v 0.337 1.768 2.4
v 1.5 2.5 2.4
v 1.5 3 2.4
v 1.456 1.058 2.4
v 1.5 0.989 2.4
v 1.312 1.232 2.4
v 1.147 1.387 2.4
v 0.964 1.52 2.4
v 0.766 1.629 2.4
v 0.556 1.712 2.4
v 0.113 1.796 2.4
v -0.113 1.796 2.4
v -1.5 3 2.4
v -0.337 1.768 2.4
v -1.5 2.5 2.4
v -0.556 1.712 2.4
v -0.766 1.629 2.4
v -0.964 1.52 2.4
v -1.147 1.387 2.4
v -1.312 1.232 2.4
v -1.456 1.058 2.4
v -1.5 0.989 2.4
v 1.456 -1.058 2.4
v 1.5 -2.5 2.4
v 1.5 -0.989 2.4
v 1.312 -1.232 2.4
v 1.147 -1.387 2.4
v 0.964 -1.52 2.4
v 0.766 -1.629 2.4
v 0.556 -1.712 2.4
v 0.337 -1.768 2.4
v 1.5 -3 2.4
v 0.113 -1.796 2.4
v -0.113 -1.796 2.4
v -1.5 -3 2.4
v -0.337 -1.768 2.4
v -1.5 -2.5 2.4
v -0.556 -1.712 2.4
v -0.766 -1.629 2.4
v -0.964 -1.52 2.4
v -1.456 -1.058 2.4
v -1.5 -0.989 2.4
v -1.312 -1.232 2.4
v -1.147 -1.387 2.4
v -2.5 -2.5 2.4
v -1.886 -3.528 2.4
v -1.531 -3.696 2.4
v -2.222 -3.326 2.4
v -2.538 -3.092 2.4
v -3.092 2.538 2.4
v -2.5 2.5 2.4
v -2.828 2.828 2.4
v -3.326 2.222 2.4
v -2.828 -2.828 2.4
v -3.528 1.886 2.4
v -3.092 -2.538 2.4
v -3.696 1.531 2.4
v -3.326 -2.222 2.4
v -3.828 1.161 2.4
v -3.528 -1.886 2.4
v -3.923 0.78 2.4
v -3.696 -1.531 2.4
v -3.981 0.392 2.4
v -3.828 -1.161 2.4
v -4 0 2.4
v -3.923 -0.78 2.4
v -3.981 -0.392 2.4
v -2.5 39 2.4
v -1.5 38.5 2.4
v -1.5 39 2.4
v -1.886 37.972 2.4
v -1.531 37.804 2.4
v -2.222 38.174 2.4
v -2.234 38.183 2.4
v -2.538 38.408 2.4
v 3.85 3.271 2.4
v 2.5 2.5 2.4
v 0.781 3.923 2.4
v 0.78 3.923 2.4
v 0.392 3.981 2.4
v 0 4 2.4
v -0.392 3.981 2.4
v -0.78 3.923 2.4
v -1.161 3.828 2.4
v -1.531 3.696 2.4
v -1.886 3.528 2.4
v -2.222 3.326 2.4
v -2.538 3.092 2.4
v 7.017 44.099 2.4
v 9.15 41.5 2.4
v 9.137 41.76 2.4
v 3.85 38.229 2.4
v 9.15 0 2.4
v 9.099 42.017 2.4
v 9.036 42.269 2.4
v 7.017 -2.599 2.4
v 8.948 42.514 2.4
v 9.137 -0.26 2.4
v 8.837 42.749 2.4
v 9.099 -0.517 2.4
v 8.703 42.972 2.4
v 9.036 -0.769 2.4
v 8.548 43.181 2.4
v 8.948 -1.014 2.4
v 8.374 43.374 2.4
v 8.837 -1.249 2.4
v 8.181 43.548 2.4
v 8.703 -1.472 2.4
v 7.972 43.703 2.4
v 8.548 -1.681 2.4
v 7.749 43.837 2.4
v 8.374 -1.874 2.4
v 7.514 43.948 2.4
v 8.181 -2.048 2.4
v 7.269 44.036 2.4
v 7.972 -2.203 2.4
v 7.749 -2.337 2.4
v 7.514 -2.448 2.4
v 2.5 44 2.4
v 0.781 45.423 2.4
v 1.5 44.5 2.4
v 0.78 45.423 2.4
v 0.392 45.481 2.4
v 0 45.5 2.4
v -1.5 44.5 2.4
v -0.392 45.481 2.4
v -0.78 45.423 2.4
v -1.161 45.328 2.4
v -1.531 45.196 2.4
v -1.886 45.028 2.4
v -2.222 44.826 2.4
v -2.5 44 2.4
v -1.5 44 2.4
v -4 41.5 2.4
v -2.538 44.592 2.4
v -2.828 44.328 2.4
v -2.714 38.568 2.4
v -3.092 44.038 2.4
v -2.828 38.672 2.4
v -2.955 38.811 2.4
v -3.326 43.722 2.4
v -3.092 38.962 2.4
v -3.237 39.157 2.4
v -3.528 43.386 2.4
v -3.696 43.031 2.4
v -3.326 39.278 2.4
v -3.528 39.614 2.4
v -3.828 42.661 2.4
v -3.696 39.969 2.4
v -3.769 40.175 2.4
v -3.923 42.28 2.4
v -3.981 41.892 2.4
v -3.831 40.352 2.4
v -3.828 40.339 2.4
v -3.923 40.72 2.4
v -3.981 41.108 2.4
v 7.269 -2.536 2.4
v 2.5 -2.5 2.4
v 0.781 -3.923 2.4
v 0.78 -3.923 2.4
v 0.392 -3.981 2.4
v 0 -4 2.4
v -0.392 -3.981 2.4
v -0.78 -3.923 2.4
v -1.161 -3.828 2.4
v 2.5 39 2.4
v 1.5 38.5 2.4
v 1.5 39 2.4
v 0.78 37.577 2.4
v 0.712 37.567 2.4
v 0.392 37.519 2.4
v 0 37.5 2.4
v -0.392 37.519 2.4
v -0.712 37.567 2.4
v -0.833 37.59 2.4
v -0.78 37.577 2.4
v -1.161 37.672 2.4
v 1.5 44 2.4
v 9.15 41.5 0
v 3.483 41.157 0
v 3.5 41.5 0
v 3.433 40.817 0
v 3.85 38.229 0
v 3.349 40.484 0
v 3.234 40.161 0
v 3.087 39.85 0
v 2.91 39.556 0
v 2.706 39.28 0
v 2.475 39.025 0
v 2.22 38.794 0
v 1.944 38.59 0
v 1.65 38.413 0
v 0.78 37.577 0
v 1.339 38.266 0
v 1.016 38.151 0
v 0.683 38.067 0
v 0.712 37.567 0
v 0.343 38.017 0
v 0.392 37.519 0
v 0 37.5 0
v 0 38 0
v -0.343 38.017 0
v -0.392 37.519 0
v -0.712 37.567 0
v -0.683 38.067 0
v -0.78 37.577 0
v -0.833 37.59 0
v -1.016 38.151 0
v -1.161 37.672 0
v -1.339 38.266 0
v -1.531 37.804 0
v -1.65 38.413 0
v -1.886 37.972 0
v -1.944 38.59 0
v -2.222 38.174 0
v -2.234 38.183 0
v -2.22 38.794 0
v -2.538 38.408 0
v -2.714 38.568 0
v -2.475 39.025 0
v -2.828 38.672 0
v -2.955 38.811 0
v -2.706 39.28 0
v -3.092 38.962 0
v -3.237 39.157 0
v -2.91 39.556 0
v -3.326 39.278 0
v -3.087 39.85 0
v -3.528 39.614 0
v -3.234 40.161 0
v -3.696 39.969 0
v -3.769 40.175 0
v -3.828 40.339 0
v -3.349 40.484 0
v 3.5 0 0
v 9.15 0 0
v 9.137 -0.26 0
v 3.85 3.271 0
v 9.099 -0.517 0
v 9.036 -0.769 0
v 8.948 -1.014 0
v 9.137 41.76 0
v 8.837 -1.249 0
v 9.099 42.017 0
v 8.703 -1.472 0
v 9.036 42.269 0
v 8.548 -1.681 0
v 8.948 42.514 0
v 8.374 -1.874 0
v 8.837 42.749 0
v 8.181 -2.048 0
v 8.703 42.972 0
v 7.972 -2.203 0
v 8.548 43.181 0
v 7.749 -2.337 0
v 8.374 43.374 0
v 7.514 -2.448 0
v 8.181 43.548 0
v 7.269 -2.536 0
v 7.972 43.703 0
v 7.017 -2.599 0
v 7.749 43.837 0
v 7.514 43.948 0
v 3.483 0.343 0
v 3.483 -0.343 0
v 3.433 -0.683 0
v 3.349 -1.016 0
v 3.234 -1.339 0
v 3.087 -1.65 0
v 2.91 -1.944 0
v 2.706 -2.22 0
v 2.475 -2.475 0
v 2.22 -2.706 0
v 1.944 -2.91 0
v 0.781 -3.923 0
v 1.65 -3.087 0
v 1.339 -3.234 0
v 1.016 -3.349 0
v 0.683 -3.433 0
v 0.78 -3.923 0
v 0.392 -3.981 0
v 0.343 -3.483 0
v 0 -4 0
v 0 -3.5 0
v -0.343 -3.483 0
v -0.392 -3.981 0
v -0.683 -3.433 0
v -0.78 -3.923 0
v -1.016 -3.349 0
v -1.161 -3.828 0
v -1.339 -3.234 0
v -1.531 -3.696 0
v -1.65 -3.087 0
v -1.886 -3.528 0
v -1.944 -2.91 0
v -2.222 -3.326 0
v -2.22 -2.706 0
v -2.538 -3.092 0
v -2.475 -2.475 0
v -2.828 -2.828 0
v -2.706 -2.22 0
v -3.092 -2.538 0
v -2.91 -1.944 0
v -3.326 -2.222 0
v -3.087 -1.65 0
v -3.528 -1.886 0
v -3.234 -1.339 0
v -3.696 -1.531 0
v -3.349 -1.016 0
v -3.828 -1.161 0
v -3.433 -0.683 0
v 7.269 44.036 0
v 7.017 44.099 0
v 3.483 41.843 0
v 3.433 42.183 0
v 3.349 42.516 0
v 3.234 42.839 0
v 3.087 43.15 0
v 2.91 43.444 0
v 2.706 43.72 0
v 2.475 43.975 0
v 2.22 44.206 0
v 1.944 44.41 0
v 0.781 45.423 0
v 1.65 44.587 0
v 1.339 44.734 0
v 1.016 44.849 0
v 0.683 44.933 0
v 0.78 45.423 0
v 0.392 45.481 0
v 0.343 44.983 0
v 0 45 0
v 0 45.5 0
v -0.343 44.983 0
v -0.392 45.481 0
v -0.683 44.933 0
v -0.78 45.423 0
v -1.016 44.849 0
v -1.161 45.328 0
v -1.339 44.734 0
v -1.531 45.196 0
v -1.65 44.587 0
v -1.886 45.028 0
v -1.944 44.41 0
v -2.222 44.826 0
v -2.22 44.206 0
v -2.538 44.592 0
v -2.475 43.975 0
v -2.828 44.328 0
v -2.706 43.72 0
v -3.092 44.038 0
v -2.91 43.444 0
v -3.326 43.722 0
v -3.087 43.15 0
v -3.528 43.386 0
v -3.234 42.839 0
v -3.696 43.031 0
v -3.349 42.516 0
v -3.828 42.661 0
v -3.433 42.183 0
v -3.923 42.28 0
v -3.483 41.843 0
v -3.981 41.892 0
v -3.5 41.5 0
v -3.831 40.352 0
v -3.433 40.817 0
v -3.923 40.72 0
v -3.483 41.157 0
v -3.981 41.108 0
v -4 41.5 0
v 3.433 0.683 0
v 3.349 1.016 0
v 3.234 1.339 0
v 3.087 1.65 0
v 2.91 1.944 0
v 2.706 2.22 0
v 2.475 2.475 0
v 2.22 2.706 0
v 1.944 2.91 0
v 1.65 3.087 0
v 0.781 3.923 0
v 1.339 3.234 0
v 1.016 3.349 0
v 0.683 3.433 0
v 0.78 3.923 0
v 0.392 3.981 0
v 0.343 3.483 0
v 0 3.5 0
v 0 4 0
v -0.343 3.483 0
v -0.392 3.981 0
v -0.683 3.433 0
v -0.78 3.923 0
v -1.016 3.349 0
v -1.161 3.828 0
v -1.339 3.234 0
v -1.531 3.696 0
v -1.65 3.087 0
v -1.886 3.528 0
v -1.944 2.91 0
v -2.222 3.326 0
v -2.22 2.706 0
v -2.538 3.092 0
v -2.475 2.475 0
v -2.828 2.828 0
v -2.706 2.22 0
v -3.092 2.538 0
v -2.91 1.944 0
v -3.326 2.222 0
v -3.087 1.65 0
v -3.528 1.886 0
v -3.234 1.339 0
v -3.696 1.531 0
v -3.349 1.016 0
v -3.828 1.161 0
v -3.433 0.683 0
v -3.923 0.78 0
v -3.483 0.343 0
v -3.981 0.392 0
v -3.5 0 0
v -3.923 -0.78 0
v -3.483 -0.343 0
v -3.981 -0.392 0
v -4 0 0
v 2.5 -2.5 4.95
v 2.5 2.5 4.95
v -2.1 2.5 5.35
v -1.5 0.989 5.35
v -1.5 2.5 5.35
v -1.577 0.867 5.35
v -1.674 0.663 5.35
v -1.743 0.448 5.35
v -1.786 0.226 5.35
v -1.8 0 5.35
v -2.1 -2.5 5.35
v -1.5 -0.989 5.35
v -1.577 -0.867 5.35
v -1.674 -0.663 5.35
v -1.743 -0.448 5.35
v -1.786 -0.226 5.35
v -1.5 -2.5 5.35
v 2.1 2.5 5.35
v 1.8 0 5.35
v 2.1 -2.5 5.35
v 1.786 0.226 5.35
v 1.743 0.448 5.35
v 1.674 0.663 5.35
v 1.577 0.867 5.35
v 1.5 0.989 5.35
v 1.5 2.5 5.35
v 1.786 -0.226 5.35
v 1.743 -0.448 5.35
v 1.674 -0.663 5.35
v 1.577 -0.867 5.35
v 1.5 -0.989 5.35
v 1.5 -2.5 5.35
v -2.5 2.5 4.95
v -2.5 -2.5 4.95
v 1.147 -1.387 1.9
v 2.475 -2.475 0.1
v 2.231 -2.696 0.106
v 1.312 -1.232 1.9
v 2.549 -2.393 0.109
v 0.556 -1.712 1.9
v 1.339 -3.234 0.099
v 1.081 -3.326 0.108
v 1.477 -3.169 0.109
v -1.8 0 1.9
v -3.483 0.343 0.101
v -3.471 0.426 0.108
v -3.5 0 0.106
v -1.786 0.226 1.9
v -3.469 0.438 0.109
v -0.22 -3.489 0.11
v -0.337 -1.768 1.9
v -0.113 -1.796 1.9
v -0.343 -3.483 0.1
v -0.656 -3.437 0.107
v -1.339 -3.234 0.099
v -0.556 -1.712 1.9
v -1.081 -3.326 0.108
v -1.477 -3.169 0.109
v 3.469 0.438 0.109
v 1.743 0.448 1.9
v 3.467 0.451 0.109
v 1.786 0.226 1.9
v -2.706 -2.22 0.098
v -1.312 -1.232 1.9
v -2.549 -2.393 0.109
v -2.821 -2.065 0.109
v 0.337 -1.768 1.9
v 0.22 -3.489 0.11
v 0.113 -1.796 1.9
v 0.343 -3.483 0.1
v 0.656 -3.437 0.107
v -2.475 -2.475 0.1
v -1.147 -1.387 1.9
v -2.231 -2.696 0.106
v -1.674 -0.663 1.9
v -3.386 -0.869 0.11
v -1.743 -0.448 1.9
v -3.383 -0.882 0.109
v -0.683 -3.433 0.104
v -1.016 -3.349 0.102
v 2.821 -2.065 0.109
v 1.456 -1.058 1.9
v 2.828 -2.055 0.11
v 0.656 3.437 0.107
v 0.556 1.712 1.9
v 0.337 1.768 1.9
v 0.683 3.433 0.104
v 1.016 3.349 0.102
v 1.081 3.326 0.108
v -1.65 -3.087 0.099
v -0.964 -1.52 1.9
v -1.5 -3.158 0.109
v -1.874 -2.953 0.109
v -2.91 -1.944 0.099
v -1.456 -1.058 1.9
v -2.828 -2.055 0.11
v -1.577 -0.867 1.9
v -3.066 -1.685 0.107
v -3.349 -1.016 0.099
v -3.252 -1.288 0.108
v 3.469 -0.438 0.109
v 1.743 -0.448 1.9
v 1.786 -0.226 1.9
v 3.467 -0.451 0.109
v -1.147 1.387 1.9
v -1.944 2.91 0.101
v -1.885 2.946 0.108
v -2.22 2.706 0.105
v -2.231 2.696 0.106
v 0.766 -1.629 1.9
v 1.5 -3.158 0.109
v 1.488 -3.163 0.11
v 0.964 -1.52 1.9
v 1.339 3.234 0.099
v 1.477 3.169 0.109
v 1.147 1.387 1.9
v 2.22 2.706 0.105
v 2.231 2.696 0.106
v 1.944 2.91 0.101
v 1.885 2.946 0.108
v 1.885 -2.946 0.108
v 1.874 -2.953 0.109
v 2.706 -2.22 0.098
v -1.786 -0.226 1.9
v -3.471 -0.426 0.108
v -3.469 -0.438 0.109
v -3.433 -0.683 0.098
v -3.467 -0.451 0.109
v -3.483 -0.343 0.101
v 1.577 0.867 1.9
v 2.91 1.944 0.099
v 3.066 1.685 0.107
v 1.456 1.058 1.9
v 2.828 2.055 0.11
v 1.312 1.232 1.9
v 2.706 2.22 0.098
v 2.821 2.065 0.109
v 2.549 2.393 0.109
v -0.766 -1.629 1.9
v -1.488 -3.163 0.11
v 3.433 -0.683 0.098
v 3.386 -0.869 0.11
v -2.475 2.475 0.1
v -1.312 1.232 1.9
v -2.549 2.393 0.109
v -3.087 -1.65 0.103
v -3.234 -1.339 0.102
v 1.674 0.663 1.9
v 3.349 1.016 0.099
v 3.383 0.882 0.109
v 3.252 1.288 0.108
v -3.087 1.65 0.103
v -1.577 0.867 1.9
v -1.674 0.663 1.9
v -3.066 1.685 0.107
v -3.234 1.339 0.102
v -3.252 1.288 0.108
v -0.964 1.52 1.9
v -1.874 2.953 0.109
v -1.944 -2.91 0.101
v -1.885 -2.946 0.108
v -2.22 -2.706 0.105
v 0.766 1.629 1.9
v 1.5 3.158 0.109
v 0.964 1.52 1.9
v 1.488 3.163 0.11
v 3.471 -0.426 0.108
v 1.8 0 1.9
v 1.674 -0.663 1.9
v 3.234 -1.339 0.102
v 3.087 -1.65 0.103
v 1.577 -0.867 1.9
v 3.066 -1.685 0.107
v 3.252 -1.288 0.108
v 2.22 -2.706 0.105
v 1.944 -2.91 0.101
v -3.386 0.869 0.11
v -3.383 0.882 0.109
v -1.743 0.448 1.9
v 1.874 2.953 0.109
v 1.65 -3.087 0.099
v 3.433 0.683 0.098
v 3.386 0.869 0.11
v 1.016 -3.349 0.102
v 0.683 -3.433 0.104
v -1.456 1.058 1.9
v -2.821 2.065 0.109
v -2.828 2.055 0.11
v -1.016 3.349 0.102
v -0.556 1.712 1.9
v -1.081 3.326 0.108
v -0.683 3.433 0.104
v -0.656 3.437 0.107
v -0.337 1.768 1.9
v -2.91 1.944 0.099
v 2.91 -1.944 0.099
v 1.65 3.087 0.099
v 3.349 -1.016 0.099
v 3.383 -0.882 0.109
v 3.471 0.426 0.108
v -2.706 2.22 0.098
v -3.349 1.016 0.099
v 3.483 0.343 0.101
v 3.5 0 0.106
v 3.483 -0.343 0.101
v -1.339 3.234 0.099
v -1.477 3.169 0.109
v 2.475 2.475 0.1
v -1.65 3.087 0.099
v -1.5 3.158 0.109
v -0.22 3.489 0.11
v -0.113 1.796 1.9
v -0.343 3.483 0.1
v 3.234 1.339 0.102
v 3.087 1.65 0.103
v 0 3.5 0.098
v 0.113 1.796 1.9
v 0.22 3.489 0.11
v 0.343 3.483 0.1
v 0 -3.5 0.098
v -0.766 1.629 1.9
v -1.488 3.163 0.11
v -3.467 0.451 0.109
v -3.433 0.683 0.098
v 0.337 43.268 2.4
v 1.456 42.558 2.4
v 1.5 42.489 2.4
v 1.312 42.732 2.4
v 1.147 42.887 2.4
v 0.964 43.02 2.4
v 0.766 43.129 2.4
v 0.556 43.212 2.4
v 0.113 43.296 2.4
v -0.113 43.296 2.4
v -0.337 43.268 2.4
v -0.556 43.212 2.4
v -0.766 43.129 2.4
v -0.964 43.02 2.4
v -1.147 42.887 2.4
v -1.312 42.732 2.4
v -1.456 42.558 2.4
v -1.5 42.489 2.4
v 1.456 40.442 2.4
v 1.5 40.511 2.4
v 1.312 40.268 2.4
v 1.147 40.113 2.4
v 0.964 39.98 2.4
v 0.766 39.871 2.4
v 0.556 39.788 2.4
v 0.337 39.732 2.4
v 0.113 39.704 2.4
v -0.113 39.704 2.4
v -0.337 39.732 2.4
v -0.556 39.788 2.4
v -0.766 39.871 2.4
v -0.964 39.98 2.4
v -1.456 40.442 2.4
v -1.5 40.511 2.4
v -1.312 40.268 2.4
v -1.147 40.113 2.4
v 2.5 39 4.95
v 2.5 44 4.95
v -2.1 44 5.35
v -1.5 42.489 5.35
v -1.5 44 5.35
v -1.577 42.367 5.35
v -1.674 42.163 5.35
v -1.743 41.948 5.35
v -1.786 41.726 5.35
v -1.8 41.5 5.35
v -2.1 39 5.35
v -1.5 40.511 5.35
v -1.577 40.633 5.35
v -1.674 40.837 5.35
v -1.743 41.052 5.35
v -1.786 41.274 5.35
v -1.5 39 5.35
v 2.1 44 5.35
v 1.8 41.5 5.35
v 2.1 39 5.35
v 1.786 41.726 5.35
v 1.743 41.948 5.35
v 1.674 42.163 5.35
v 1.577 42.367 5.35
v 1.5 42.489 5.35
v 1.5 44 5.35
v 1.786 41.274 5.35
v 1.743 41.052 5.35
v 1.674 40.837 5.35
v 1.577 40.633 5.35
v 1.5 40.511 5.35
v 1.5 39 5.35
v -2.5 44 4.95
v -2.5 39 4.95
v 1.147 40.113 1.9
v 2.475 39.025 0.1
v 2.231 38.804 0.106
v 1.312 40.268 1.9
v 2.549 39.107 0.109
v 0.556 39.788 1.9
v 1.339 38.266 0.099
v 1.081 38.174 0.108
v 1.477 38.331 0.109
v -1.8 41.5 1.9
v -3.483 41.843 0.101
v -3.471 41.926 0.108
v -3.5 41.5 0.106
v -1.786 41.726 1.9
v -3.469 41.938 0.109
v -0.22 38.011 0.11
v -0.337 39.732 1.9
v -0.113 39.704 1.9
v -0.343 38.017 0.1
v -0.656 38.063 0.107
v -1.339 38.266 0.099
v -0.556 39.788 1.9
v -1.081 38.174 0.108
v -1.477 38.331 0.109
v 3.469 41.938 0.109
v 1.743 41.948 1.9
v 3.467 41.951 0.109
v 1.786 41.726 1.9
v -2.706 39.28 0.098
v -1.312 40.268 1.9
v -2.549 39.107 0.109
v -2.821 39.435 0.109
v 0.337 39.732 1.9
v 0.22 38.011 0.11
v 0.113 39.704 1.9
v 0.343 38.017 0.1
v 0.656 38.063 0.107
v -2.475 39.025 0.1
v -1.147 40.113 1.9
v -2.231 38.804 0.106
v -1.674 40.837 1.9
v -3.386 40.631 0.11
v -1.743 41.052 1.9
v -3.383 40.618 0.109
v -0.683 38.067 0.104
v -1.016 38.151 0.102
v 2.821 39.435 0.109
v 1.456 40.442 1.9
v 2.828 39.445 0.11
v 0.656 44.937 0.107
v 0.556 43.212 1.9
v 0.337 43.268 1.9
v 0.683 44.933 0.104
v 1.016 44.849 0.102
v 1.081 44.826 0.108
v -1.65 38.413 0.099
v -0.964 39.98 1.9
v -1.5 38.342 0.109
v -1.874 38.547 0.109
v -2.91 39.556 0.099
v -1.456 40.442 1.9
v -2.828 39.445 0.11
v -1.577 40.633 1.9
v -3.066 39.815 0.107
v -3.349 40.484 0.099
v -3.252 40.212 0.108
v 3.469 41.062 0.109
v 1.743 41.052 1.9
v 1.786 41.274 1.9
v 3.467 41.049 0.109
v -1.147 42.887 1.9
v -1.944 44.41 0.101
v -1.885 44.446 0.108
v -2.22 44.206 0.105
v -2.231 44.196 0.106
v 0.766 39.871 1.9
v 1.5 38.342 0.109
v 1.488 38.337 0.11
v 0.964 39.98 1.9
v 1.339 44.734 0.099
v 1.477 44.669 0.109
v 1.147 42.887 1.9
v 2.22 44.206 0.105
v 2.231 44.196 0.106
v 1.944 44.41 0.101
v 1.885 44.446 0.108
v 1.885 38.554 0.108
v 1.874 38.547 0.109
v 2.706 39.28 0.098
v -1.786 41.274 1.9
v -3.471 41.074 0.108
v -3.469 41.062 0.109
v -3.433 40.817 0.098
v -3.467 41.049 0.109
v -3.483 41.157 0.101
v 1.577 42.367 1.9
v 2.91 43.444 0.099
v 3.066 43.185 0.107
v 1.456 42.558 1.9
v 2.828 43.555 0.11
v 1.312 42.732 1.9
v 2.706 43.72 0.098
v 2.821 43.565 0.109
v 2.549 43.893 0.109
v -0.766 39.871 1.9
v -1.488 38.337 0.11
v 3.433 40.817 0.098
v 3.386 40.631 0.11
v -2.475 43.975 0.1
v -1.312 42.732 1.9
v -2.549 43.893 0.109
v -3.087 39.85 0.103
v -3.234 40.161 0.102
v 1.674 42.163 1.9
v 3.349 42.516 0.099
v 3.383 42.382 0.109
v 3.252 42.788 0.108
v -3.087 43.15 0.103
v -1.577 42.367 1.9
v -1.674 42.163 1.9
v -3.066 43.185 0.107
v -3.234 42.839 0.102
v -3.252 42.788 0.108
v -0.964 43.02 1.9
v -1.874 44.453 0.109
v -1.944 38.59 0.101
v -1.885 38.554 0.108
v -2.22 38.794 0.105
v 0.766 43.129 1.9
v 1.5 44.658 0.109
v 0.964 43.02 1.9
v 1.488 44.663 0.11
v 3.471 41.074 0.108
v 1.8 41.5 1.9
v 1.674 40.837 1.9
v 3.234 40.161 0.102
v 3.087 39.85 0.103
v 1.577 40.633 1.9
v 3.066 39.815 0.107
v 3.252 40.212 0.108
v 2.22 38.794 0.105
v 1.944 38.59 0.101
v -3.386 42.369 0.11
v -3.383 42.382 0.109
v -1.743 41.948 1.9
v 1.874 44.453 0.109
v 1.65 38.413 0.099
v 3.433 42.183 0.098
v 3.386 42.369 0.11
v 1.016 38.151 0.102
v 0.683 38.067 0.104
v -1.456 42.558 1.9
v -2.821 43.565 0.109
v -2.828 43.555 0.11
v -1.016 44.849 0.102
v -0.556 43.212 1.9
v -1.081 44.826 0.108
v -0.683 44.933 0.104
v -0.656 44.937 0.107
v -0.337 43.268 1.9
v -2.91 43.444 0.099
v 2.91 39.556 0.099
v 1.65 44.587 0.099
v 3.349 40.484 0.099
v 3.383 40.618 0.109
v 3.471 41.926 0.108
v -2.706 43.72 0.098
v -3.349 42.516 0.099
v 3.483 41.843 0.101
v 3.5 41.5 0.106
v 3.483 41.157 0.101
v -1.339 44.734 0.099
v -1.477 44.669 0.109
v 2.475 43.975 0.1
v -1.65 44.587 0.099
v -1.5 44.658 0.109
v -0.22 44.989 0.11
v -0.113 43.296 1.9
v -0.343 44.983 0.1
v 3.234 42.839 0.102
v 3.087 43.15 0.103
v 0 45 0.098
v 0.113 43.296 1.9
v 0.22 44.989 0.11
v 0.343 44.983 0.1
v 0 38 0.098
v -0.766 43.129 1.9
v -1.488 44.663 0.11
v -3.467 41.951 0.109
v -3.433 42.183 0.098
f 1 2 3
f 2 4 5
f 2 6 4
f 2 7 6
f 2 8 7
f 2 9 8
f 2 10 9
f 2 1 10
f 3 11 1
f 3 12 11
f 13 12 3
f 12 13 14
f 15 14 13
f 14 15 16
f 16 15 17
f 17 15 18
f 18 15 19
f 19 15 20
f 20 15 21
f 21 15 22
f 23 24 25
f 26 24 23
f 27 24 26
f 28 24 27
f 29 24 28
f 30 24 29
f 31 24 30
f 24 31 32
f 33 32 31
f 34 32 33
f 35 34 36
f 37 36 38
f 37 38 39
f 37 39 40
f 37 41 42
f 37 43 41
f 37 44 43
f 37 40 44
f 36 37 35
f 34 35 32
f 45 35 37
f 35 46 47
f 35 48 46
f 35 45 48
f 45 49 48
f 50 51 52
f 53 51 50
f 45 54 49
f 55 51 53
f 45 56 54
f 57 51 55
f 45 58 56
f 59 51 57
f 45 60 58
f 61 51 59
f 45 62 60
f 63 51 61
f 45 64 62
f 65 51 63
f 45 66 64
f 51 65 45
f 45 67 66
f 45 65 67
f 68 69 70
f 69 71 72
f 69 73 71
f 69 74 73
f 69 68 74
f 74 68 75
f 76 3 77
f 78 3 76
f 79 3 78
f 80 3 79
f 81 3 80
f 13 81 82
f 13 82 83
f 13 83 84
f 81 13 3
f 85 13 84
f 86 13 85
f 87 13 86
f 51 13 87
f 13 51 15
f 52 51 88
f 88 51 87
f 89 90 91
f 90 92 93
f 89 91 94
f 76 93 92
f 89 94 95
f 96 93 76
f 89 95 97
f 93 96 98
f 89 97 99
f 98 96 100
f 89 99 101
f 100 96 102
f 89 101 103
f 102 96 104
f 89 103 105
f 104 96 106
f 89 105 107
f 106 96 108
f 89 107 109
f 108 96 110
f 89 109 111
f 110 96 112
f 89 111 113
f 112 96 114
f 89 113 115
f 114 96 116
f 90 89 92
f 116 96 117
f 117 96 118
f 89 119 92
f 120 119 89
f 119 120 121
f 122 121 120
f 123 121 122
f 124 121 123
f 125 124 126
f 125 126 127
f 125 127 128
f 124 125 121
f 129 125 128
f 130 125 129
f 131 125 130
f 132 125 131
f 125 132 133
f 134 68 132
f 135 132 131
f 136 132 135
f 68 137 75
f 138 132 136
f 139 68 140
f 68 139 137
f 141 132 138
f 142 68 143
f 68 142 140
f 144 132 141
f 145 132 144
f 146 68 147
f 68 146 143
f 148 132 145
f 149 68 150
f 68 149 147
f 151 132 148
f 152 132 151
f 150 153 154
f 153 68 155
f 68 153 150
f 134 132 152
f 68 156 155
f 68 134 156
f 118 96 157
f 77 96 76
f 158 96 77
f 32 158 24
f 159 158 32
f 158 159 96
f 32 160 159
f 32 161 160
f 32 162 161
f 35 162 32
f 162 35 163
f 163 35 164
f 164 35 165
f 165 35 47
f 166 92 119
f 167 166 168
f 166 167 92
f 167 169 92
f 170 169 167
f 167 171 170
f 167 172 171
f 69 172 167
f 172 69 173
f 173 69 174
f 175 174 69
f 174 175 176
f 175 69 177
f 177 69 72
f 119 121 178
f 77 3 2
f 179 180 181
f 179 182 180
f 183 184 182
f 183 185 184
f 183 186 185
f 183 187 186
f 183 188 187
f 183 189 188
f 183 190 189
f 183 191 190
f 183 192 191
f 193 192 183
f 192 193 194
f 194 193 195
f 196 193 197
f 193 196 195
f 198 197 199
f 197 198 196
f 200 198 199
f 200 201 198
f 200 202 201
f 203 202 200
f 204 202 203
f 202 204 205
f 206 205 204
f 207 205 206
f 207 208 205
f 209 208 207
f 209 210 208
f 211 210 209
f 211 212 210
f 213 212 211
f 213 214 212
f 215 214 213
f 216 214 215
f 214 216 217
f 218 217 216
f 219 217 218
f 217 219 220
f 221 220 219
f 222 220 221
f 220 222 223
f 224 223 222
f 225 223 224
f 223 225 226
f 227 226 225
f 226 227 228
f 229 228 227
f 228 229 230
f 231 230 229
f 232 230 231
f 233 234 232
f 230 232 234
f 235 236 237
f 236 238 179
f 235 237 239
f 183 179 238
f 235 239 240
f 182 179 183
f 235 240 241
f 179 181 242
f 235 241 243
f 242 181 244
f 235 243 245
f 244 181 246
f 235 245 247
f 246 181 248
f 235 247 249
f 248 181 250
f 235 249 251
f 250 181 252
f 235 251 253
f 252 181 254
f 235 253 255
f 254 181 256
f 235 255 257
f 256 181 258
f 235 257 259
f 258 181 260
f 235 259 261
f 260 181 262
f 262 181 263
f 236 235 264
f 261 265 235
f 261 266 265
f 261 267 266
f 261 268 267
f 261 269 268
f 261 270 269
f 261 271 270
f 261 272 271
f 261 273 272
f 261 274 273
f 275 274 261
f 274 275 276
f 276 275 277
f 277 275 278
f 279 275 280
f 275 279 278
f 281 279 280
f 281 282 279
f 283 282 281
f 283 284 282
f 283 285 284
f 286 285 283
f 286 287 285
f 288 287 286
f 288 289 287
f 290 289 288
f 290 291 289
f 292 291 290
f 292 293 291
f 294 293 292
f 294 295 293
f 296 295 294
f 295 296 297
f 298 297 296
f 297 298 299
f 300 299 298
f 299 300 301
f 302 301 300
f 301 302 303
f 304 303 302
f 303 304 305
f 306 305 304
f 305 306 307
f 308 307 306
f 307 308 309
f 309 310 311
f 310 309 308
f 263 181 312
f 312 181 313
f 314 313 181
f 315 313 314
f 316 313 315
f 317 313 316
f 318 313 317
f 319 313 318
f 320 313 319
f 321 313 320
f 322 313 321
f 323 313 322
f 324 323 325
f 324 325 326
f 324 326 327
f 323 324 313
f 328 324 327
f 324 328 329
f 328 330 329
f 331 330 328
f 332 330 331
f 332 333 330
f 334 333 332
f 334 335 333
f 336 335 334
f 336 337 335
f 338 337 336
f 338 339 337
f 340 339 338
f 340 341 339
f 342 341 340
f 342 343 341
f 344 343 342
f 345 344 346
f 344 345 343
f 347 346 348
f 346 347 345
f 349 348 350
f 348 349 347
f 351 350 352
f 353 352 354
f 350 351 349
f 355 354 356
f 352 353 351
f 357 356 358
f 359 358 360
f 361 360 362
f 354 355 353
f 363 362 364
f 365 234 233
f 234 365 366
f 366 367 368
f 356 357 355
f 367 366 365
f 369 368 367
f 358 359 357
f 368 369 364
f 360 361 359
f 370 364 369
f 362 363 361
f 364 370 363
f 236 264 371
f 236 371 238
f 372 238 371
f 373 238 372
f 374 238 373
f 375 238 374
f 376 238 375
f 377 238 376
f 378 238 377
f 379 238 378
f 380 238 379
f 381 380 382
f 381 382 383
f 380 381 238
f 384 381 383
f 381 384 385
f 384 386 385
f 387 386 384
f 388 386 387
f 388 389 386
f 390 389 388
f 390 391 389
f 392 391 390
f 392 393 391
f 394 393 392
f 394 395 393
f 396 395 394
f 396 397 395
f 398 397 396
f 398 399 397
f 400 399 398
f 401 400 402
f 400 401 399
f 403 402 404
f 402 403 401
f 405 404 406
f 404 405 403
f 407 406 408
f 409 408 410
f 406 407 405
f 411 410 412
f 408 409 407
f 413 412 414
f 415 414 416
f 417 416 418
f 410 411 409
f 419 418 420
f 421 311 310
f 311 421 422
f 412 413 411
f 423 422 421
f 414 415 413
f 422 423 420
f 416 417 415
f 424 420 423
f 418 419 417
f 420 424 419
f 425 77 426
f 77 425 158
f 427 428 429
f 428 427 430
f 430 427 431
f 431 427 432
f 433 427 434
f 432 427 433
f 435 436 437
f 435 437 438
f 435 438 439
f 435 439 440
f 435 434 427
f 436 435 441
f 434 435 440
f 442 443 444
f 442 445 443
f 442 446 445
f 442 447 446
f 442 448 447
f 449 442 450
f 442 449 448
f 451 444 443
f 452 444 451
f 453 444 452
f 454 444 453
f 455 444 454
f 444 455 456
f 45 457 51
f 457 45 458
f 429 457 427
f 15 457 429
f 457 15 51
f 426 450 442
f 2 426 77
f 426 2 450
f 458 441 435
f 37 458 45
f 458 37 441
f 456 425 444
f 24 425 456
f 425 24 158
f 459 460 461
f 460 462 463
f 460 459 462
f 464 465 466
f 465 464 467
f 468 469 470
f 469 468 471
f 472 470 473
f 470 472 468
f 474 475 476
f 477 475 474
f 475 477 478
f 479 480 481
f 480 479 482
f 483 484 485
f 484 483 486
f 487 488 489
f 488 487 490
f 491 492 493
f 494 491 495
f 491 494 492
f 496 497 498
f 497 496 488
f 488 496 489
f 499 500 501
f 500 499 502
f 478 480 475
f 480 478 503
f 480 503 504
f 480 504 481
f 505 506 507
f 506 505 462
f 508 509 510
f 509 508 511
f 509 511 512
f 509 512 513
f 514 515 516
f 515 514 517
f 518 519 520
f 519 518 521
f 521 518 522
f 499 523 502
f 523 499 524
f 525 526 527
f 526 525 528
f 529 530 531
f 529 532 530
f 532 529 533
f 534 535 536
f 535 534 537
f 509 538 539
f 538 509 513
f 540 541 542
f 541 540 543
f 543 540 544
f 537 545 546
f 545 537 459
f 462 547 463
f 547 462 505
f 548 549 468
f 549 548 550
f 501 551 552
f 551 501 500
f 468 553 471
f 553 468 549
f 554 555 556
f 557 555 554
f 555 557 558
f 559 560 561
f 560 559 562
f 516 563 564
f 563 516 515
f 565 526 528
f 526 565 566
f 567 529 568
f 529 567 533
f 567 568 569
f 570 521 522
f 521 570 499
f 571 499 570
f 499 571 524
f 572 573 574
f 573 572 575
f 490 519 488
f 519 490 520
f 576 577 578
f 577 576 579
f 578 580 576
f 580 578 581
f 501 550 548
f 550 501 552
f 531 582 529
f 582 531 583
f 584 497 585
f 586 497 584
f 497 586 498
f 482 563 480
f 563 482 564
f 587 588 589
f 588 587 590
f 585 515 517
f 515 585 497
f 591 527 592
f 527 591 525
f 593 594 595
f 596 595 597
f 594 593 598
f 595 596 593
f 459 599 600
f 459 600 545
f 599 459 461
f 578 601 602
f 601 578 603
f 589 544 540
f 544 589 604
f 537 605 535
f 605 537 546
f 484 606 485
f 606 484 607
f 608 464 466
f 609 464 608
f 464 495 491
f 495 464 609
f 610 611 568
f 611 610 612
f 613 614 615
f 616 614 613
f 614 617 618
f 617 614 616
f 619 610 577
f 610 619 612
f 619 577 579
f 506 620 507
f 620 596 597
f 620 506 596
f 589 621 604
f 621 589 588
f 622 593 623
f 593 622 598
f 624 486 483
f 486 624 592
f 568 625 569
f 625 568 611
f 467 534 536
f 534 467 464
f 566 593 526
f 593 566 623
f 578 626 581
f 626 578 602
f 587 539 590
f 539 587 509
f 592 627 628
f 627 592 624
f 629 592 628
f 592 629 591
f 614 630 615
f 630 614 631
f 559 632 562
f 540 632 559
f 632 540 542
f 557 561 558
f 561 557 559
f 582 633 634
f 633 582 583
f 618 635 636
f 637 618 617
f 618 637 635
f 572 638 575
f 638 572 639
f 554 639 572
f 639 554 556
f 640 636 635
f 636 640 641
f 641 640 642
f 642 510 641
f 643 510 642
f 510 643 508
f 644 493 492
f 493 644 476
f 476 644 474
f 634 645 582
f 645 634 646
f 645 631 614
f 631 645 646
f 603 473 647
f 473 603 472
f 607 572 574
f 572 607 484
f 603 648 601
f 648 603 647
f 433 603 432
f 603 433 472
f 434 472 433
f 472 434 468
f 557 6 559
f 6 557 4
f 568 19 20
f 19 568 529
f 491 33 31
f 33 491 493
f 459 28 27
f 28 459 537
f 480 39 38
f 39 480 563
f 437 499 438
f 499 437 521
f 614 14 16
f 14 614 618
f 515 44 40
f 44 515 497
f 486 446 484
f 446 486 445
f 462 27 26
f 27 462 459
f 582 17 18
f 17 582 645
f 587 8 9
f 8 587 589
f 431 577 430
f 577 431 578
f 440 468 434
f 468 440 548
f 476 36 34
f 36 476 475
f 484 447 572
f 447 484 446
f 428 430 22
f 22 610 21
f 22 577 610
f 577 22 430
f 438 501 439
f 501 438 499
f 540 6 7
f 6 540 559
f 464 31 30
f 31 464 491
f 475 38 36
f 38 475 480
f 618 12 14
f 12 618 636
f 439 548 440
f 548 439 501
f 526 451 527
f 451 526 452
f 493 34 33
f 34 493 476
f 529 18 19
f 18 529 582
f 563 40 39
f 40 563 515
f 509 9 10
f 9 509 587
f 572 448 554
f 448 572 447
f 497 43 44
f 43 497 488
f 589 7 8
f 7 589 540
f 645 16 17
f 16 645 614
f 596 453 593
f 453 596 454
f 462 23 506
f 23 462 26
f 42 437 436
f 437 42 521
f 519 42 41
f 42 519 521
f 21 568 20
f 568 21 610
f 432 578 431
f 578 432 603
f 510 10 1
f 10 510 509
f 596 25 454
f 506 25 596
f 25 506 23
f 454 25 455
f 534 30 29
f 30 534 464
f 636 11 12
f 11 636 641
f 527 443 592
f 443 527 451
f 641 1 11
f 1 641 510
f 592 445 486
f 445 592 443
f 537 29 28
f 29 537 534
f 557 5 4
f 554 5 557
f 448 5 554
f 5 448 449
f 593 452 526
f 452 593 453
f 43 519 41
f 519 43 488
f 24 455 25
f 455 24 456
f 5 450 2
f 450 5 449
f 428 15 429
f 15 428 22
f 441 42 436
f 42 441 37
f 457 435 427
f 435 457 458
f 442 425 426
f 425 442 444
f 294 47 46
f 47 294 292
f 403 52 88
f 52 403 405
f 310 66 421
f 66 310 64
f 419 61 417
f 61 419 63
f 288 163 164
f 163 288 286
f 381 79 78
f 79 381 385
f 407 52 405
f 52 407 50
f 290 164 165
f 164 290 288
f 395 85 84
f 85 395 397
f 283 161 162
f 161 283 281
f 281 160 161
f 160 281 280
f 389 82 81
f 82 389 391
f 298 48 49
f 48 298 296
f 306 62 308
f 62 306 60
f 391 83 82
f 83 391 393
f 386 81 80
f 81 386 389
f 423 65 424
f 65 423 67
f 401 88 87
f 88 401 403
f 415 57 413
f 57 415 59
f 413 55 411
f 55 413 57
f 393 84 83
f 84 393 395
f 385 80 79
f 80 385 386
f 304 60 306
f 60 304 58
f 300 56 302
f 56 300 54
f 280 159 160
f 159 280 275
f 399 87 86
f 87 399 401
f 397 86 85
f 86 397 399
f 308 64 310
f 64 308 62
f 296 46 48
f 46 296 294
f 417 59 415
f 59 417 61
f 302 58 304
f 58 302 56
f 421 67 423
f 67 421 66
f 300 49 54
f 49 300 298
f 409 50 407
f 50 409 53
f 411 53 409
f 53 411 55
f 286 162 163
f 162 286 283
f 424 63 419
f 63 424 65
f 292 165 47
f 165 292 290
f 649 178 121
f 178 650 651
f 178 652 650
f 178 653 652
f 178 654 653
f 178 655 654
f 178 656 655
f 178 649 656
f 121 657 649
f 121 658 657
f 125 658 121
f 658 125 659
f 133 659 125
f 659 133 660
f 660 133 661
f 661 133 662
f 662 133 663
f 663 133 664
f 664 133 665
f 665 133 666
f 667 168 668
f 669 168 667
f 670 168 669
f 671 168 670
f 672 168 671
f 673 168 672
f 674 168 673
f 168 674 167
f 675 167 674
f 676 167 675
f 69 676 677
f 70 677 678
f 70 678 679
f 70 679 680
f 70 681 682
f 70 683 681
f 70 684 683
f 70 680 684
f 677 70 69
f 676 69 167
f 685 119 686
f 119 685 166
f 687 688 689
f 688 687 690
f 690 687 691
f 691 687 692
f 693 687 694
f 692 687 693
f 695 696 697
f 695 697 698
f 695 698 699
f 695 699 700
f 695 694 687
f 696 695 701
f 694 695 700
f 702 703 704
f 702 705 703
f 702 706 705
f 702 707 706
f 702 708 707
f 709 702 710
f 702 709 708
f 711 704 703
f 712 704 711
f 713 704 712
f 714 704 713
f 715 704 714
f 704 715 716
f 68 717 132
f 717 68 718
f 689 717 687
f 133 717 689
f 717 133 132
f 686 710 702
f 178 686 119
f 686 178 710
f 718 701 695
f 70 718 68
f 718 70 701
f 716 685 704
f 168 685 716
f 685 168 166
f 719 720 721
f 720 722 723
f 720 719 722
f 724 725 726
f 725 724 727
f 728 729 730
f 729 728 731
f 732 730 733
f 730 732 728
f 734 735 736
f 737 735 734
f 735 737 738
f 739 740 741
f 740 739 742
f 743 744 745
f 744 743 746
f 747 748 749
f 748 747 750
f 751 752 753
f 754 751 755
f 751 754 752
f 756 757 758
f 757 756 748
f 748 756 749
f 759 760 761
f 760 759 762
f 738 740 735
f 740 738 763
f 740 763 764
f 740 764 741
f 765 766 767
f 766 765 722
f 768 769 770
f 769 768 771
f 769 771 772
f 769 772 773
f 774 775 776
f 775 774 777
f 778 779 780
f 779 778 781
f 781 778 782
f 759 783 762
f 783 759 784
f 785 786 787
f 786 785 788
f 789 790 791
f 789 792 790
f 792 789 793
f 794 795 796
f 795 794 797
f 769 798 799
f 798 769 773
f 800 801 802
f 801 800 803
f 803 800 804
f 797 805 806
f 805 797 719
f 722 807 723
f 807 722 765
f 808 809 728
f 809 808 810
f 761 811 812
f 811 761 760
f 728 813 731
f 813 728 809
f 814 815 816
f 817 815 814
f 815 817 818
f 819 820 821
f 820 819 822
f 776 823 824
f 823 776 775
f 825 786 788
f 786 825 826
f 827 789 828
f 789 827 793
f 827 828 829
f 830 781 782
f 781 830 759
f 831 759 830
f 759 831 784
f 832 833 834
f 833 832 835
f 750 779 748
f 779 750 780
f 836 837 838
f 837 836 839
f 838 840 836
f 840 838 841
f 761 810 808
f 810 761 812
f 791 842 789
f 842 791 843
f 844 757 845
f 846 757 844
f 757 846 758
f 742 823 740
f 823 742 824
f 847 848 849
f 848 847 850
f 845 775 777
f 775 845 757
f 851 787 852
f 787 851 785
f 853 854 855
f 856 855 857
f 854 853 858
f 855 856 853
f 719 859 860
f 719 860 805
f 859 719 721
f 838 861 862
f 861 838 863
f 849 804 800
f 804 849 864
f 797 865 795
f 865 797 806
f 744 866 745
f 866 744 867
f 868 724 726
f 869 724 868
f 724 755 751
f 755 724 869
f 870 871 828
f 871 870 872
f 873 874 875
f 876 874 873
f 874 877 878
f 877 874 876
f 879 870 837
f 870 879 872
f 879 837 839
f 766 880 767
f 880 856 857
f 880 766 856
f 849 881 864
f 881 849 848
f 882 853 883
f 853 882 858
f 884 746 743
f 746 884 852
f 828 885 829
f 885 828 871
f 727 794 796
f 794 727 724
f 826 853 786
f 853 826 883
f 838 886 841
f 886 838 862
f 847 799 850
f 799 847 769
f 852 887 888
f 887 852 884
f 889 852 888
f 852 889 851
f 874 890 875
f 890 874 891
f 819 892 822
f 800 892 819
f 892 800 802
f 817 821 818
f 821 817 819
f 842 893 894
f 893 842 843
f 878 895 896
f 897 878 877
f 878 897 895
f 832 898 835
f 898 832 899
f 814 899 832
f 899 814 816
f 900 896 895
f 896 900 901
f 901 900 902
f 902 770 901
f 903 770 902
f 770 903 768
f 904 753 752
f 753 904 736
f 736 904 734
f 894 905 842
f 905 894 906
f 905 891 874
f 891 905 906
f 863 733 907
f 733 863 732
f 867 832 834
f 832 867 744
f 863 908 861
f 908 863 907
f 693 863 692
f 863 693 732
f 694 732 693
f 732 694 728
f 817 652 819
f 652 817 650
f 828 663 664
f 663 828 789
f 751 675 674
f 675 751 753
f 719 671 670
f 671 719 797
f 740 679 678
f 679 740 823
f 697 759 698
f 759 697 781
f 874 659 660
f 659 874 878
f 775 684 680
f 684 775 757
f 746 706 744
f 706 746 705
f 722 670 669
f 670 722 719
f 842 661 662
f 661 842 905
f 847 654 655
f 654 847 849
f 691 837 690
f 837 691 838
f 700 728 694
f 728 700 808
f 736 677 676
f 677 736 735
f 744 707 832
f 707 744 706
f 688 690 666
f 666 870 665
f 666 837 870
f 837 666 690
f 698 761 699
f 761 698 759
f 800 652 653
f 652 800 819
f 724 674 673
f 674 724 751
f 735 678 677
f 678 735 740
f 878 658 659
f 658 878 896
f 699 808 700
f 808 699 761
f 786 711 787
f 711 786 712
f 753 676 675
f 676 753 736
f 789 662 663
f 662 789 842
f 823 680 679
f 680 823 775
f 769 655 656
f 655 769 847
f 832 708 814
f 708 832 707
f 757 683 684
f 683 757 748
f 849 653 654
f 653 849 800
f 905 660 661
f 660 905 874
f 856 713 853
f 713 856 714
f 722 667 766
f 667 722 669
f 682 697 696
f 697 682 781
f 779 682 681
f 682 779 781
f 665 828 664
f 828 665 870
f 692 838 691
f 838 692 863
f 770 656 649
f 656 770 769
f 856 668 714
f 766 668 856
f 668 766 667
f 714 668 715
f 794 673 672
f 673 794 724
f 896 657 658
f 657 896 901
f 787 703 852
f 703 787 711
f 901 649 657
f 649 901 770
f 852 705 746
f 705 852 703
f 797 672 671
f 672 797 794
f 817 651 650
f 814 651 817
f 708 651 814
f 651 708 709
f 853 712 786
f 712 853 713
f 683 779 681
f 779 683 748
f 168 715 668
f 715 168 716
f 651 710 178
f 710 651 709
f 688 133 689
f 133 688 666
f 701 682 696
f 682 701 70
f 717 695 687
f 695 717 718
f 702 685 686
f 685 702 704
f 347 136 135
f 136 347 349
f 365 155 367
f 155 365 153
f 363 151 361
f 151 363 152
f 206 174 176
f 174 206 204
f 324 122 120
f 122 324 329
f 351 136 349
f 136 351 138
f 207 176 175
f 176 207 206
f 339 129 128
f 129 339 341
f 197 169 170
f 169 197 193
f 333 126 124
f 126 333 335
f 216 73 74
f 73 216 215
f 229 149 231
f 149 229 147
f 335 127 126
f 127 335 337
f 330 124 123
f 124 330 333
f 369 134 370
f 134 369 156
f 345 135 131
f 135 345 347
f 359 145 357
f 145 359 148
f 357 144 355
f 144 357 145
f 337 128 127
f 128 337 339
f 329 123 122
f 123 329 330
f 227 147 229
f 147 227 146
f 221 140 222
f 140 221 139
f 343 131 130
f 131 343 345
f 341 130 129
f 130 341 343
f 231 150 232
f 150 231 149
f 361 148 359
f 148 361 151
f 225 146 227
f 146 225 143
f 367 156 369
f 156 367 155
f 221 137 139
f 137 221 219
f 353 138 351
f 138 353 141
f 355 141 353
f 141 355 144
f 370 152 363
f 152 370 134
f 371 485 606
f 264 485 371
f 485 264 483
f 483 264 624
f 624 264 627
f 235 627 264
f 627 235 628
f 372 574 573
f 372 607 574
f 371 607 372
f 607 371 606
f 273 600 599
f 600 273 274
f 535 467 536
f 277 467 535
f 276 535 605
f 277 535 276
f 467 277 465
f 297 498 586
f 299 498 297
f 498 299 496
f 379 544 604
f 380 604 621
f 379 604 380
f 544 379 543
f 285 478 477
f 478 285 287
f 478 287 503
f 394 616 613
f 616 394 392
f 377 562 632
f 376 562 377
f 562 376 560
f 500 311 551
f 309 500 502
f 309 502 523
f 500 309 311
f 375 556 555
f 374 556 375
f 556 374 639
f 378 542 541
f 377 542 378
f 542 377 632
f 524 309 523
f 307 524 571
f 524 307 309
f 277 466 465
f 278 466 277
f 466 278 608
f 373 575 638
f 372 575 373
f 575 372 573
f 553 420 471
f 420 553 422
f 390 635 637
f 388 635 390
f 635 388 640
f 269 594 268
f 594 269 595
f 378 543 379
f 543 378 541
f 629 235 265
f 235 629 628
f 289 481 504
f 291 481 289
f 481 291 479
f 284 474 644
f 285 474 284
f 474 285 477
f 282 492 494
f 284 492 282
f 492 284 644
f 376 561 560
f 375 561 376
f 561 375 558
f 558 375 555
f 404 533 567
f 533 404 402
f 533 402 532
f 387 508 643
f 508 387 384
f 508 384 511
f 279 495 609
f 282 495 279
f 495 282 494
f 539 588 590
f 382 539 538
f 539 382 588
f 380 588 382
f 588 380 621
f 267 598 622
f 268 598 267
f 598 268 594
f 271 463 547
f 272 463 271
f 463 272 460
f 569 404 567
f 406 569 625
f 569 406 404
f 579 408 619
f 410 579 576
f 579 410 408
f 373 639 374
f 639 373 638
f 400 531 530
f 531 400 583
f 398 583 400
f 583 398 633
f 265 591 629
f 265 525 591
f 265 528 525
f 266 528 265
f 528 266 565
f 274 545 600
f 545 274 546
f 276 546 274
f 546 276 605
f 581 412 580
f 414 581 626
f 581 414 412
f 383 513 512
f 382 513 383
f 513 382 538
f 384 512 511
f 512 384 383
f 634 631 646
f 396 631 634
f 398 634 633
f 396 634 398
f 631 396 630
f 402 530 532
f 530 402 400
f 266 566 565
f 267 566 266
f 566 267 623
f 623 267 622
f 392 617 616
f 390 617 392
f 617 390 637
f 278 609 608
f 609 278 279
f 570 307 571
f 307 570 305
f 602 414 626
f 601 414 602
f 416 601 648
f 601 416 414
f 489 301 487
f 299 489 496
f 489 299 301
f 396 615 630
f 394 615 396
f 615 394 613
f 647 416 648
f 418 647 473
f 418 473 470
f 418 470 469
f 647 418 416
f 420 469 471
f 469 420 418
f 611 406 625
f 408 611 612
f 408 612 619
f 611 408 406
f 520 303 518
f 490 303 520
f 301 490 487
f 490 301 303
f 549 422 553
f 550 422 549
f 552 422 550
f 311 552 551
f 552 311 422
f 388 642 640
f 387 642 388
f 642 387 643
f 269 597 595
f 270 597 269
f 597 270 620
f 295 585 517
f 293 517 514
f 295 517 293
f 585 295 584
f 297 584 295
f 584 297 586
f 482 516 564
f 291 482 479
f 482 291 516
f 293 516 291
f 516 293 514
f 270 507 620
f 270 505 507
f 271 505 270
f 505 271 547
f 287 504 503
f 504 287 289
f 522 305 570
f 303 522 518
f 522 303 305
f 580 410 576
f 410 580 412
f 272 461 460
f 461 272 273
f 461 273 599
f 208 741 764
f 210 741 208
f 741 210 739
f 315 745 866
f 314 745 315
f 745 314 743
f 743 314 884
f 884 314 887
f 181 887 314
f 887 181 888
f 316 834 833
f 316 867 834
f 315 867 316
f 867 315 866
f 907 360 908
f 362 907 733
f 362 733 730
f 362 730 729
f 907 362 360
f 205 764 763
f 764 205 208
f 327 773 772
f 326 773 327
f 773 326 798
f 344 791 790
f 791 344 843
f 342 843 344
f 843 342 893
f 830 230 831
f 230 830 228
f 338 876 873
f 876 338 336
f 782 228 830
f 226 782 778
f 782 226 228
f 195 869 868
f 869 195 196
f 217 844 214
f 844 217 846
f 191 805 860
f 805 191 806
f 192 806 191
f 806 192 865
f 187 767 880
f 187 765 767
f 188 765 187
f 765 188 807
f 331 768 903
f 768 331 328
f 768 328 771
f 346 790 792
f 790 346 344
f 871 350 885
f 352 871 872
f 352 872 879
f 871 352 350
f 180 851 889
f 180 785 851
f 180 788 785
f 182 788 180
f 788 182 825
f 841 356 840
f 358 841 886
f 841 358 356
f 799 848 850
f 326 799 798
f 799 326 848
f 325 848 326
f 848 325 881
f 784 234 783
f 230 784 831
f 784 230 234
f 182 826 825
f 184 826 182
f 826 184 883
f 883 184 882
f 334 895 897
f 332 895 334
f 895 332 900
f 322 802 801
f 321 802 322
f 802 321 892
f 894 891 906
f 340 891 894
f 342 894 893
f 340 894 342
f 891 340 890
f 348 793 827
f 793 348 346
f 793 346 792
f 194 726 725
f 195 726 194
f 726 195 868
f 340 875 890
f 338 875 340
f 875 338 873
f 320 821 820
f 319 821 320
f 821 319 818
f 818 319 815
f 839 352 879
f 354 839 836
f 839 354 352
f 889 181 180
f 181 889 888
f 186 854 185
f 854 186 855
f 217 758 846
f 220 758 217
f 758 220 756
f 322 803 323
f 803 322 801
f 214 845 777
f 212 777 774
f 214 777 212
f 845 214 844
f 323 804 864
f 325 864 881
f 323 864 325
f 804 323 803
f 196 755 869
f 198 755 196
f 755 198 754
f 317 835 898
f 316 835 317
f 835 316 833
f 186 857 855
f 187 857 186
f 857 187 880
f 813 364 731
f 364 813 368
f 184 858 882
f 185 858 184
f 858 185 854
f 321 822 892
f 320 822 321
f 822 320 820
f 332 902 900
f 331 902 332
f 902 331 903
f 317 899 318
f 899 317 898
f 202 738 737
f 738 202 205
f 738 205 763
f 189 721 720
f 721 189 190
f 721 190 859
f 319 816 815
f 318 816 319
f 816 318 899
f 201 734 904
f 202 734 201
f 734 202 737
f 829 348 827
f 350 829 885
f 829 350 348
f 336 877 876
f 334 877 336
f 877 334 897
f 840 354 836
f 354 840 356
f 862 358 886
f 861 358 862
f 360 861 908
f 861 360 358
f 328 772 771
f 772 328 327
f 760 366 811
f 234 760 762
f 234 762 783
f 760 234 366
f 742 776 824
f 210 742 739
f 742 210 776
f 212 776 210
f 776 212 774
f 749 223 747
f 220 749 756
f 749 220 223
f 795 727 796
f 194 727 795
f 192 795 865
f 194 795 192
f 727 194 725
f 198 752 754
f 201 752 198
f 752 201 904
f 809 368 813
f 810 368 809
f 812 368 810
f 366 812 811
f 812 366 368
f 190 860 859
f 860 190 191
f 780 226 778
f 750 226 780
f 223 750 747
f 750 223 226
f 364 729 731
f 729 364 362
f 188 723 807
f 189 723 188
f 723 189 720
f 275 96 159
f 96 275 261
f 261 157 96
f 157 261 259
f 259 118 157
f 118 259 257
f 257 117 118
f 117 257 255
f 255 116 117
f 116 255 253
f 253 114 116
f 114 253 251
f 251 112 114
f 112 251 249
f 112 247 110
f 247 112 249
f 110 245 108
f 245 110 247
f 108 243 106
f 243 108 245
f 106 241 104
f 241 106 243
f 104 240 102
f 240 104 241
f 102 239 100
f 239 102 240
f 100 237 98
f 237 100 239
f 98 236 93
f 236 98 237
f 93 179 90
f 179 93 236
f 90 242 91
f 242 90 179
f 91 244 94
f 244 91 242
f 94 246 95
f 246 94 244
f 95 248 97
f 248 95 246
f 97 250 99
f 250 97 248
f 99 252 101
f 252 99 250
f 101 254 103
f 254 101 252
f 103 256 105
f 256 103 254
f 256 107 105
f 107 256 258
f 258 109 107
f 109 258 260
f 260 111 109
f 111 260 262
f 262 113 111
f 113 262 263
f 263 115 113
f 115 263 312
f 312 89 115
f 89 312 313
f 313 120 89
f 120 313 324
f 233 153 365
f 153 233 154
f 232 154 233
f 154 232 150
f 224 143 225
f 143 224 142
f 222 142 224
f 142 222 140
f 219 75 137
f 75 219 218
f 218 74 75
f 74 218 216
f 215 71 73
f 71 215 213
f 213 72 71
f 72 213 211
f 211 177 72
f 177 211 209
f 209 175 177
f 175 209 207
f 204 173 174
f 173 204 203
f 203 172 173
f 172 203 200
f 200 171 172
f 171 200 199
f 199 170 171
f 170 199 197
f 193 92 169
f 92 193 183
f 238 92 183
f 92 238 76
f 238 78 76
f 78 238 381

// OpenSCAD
// file: native_adapter.scad
$fn = 50;

difference() {
	union() {
		translate(v = [0, 0, 0]) {
			rotate(a = [0, 0, 0]) {
				difference() {
					union() {
						translate(v = [0, 0, 0]) {
							rotate(a = [0, 0, 0]) {
								difference() {
									union() {
										translate(v = [-0.35, 0, 0]) {
											hull() {
												translate(v = [-4.4, 4.25, 0]) {
													cylinder(h = 2.4, r = 0.75);
												}
												translate(v = [4.4, 4.25, 0]) {
													cylinder(h = 2.4, r = 0.75);
												}
												translate(v = [-4.4, -4.25, 0]) {
													cylinder(h = 2.4, r = 0.75);
												}
												translate(v = [4.4, -4.25, 0]) {
													cylinder(h = 2.4, r = 0.75);
												}
											}
										}
										translate(v = [-2.5, -2.5, 2.35]) {
											cube(size = [5.0, 5.0, 3.0]);
										}
									}
									union() {
										translate(v = [0, 0, 0]) {
											rotate(a = [0, 180, 0]) {
												difference() {
													union() {
														translate(v = [0, 0, -20.0]) {
															cylinder(h = 20.0, r = 1.5);
														}
														translate(v = [0, 0, -1.9]) {
															cylinder(h = 1.9, r1 = 1.8, r2 = 3.6);
														}
														cylinder(h = 250, r = 3.6);
														translate(v = [0, 0, -20.0]) {
															cylinder(h = 20.0, r = 1.8);
														}
														translate(v = [0, 0, -20.0]) {
															cylinder(h = 20.0, r = 1.5);
														}
													}
													union();
												}
											}
										}
										translate(v = [-1.5, -3.0, 2.4]) {
											cube(size = [3.0, 6.0, 3.0500000000000003]);
										}
										translate(v = [0, 2.6, 0]) {
											rotate(a = [90, 0, 0]) {
												linear_extrude(height = 5.2) {
													polygon(points = [[-2.7, 4.75], [-1.9, 5.55], [-2.7, 5.55]]);
												}
											}
										}
										translate(v = [0, 2.6, 0]) {
											rotate(a = [90, 0, 0]) {
												linear_extrude(height = 5.2) {
													polygon(points = [[2.7, 4.75], [1.9, 5.55], [2.7, 5.55]]);
												}
											}
										}
										translate(v = [-4.6, -5.5, -0.1]) {
											cylinder(h = 2.6, r = 3.15);
										}
										translate(v = [-4.6, 5.5, -0.1]) {
											cylinder(h = 2.6, r = 3.15);
										}
										translate(v = [4.6, -5.5, -0.1]) {
											cylinder(h = 2.6, r = 3.15);
										}
										translate(v = [4.6, 5.5, -0.1]) {
											cylinder(h = 2.6, r = 3.15);
										}
									}
								}
							}
						}
					}
					union();
				}
			}
		}
	}
	union();
}
// file: beam_joint_geometry.scad
$fn=64;
tie_t=2.4;
module native_adapter(){
include <native_adapter.scad>
}

module joint_bores(holes,wood) {
  // Leave the OOBB countersink and pilot cheeks of each native adapter intact.
  for(p=holes) translate([p[0],p[1],-.05]) cylinder(d=7,h=tie_t+.1);
  if(len(wood)) translate(wood) {
    translate([0,0,-.05]) cylinder(d=4,h=tie_t+.1);
    translate([0,0,-.01]) cylinder(d1=7.02,d2=4,h=1.51);
  }
}

module foot(p,r) { translate(p) circle(r=r); }
module strap(a,b,ra,rb) { hull(){ foot(a,ra); foot(b,rb); } }
module beam_joint(holes,spine=[],wood=[]) {
  union(){
    for(p=holes) translate(p) intersection(){
      native_adapter();
      cylinder(r=4,h=12);
    }
    difference(){
      linear_extrude(tie_t) union(){
        if(len(wood)) strap(holes[0],wood,4,4.6);
        else if(len(spine)==0) strap(holes[0],holes[1],4,4);
        else {
          strap(spine[0],spine[1],2.65,2.65);
          for(p=holes) strap(p,[spine[0][0],p[1]],4,2.65);
        }
      }
      joint_bores(holes,wood);
    }
  }
}
// main file
include <beam_joint_geometry.scad>
beam_joint([[0, 0], [0, 41.5]],[[6.5, 0], [6.5, 41.5]],[]);
